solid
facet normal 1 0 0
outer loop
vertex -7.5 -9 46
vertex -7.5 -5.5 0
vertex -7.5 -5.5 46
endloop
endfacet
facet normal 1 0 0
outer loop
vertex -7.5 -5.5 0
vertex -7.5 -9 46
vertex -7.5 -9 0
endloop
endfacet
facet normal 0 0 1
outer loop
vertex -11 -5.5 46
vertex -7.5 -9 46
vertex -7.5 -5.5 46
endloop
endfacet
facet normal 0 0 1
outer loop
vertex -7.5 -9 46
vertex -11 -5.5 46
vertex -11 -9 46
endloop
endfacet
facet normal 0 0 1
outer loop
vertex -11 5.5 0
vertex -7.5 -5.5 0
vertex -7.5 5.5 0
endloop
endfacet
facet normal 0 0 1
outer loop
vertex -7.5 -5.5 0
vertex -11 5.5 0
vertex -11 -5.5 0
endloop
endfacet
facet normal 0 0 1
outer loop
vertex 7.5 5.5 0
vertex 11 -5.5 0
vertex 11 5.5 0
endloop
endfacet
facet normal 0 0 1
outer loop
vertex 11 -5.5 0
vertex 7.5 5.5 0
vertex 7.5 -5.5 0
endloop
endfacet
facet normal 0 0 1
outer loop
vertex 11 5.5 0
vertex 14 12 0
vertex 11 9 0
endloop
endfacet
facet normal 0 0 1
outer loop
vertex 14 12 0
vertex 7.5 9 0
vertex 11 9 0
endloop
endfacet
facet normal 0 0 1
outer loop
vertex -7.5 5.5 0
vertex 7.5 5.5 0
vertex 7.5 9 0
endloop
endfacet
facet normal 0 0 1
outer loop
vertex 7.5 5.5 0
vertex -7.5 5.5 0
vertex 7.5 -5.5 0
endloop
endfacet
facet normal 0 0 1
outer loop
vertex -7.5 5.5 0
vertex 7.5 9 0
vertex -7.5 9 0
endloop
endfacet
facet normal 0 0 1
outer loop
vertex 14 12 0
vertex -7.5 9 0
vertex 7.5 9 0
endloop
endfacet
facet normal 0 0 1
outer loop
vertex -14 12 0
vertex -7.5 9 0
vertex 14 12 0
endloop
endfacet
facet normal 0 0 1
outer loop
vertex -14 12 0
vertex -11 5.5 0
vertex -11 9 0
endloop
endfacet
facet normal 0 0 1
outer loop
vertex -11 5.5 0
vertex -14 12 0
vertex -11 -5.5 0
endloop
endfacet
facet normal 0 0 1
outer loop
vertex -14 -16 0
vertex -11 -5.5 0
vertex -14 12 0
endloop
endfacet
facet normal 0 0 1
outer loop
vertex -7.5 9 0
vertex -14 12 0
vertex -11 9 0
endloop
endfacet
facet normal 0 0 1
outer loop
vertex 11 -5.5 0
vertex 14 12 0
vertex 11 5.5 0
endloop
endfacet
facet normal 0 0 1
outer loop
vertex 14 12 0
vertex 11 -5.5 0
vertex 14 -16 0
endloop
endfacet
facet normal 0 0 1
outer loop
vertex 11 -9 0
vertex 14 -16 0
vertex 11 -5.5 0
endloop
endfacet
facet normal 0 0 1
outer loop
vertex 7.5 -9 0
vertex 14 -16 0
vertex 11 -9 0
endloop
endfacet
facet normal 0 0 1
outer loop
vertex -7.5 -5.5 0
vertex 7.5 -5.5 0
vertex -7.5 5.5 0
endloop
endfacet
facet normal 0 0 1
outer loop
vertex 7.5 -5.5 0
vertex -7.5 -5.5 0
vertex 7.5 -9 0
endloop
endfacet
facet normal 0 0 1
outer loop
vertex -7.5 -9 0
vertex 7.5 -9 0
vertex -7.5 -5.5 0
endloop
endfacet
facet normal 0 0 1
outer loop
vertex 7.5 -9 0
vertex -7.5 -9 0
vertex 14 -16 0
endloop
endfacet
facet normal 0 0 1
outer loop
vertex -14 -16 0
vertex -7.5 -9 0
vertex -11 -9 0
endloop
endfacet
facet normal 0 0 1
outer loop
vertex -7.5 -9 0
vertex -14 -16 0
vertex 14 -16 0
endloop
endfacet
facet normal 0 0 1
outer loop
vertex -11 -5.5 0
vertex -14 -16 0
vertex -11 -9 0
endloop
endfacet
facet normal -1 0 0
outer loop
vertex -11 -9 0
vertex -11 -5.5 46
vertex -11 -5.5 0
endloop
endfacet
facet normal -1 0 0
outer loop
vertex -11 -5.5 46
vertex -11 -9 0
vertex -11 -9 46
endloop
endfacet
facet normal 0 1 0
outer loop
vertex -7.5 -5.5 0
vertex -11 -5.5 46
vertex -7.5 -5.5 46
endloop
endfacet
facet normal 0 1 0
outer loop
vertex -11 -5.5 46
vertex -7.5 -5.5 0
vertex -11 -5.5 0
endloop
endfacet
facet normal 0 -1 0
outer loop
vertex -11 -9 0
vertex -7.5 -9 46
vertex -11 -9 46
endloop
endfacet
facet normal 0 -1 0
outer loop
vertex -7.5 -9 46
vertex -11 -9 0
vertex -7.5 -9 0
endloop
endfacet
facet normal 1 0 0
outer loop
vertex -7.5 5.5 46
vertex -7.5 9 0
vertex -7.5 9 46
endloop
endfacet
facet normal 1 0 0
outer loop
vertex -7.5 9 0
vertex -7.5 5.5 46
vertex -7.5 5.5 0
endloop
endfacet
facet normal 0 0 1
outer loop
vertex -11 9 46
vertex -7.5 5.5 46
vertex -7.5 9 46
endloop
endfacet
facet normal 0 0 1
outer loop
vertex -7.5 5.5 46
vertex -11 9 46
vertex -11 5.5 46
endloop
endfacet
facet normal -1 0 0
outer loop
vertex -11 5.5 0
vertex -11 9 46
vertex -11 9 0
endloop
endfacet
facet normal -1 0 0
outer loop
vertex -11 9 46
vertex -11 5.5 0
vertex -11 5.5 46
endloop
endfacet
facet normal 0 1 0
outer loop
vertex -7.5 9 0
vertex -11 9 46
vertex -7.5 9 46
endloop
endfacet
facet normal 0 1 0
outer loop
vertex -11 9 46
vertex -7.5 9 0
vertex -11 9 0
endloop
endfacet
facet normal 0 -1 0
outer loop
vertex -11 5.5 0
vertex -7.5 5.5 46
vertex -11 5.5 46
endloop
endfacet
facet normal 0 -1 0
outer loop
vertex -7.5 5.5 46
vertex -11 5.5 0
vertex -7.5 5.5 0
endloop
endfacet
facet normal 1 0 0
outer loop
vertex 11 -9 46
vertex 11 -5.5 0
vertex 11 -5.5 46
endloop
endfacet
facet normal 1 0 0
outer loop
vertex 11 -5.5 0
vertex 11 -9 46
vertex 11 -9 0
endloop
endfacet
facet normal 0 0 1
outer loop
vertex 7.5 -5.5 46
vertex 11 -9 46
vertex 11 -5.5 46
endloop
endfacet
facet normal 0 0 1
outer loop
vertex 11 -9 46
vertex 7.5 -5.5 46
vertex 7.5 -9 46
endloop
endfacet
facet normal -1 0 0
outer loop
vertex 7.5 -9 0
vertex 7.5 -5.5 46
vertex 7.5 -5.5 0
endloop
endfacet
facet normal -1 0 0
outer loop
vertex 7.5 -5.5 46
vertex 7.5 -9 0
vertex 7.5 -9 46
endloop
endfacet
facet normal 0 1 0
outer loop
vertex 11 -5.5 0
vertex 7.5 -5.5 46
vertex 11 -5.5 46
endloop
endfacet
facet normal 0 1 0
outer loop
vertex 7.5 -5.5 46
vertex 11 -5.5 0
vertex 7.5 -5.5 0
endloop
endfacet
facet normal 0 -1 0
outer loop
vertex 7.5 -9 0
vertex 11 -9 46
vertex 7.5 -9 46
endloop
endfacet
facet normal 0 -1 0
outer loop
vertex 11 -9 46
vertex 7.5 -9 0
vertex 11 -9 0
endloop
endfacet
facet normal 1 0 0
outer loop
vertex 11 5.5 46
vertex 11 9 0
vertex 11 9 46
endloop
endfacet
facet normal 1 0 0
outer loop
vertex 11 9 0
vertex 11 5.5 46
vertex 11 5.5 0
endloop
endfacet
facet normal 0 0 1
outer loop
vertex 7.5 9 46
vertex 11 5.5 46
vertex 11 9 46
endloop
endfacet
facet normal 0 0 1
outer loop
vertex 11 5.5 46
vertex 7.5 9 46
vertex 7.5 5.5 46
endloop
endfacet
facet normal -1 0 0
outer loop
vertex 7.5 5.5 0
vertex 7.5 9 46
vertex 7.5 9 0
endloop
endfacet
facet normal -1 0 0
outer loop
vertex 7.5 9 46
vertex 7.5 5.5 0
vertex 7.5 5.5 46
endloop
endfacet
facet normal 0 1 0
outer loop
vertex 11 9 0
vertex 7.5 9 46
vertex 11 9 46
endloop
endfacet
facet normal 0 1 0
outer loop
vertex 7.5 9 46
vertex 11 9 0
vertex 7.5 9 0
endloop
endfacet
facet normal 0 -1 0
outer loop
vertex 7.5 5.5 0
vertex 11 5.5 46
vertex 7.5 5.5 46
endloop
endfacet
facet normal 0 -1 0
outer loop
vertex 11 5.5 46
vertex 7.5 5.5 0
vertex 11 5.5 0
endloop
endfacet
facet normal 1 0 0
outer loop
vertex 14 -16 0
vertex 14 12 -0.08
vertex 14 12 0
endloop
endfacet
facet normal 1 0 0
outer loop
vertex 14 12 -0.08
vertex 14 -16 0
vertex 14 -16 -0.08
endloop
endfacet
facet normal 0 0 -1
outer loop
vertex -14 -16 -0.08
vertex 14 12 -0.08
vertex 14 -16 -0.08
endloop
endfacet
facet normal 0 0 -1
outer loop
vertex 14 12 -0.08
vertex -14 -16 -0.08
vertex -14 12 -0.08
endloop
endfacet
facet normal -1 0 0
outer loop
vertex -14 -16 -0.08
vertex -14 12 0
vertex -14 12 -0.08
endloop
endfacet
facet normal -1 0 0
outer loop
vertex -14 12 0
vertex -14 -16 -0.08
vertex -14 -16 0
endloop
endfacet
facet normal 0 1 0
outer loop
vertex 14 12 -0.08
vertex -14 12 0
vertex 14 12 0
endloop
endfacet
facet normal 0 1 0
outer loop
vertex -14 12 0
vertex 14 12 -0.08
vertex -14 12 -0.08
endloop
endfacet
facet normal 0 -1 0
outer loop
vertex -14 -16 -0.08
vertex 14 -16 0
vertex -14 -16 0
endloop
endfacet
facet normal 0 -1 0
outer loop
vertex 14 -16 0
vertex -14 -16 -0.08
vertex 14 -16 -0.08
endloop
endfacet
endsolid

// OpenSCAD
/*
EV charger enclosure + street-light/address-base baseline
=========================================================

OpenSCAD units: inches.  Treat one OpenSCAD unit as one inch.

This model is a parameterized reconstruction of the uploaded Tinkercad OBJ.
The OBJ itself appears to have been exported in centimeters: 13.97 cm in the
OBJ maps to a 5.5" composite-decking board, and 119.38 cm maps to 47" overall
height.

Coordinate convention used here:
  X = left/right, centered on the enclosure
  Y = depth, negative Y is the street/front side
  Z = height above grade

Notes:
  - Body/enclosure depth is about 20".  The address/light projection extends
    forward, so the full visual depth including that element is larger.
  - Most composite-board intersections are intentionally allowed to overlap a
    little, as the Tinkercad model did.  This keeps the baseline easy to edit.
  - The internal lumber, conduit, fasteners, and actual equipment dimensions
    should be refined before using this as a build document.
*/

// -----------------------------------------------------------------------------
// MASTER DISPLAY SWITCHES
// -----------------------------------------------------------------------------
show_posts                  = true;
show_composite_shell        = false;
show_top_cap                = false;
show_equipment_placeholders = false;
show_ev_connector_handle    = false;
show_unifi_ap_placeholder   = false;
show_outlet_placeholder     = false;
show_conduit_placeholders   = false;
show_optional_lumber_rails  = false;
show_address_light_block    = false;
show_address_numbers        = false;
show_reference_envelope     = false;
show_footprint_pad          = true;
show_part_labels            = false;
show_imported_obj_reference = false;   // requires tinker.obj beside this .scad
show_cutlist_echos          = false;    // emits a rough BOM/cut list to console

// -----------------------------------------------------------------------------
// PRIMARY DIMENSIONS
// -----------------------------------------------------------------------------
overall_width  = 24.0;     // intended finished enclosure width
body_depth     = 20.0;     // intended enclosure depth, excluding front projection
overall_height = 47.0;     // intended finished height

// 4x4 nominal wood posts: actual roughly 3.5" x 3.5".
post_size          = 3.5;
post_height        = 46.0;
post_shell_setback = 1.0;  // distance from exterior shell face to outside of posts

// Composite decking.  The OBJ board width corresponds to 5.5".
deck_board_face_width = 5.5;   // visible face width of deck board
 deck_board_thickness = 1.0;   // board thickness / shell thickness
board_gap             = 0.125; // vertical reveal between courses
vertical_board_rows   = 8;

// Bottom ripped strip/kick strip visible in the Tinkercad model.
bottom_clearance   = 1.0;
bottom_strip_height = 1.0;
first_board_z      = bottom_clearance + bottom_strip_height + board_gap;

// Top cap boards lie flat over the enclosure.
top_cap_count         = 3;
top_cap_thickness     = deck_board_thickness;
top_cap_board_width   = deck_board_face_width;
top_cap_side_margin   = 1.0;
top_cap_front_setback = 1.1;
top_cap_rear_setback  = 1.0;
top_cap_length        = overall_width - 2 * top_cap_side_margin;
top_cap_gap           = top_cap_count > 1 ?
                        (body_depth - top_cap_front_setback - top_cap_rear_setback - top_cap_count * top_cap_board_width) / (top_cap_count - 1) : 0;

// Rear service opening approximation from the OBJ.
rear_wing_width  = deck_board_face_width;
rear_return_depth = 4.5;
side_board_length = body_depth - 2 * deck_board_thickness;

// Equipment placeholder sizes and positions, based on the OBJ scale.
equipment_backer_width     = 7.0;
equipment_backer_height    = 24.0;
equipment_backer_thickness = 0.25;
equipment_backer_center_z  = 26.0;
equipment_backer_y         = -6.0;

charger_body_width  = 6.6;
charger_body_depth  = 3.3;
charger_body_height = 6.6;
charger_body_center_z = 27.3;

holster_width  = 3.3;
holster_depth  = 1.34;
holster_height = 5.4;
holster_center_z = 16.9;

// UniFi / AP rough placeholder; set dimensions/position to actual hardware later.
ap_width  = 2.8;
ap_depth  = 1.1;
ap_height = 6.0;
ap_center = [-4.6, equipment_backer_y - 0.05, 35.4];

// 120V outlet rough placeholder; set position to the chosen circuit location.
outlet_width  = 3.0;
outlet_depth  = 1.0;
outlet_height = 4.75;
outlet_center = [4.8, equipment_backer_y - 0.05, 13.0];

// Conduit placeholders, when enabled.
conduit_od = 0.75;
conduit_center_x = 5.9;
conduit_y = equipment_backer_y - 0.2;

// Address / downward-facing light block at the front top.
front_projection_depth = 4.0;
address_block_width  = 11.75;
address_block_depth  = 4.0;
address_block_height = 4.0;
address_block_center_z = 42.35;
address_number_text = "4754";
address_text_height = 4.0;
address_text_depth  = 0.25;
address_text_center_z = 36.0;

// Optional imported Tinkercad OBJ reference.  Keep disabled unless the OBJ file
// is available next to this OpenSCAD file.
obj_reference_file = "tinker.obj";
cm_to_inch = 1 / 2.54;
obj_center_cm_x = 66.080;
obj_center_cm_y = 5.4191;

// -----------------------------------------------------------------------------
// COLORS
// -----------------------------------------------------------------------------
composite_color   = [0.17, 0.18, 0.19, 1.0];
wood_post_color   = [0.50, 0.31, 0.16, 1.0];
white_color       = [0.98, 0.98, 0.98, 1.0];
light_gray_color  = [0.74, 0.78, 0.80, 1.0];
mid_gray_color    = [0.38, 0.40, 0.42, 1.0];
dark_gray_color   = [0.12, 0.13, 0.14, 1.0];
conduit_color     = [0.62, 0.62, 0.60, 1.0];
lens_color        = [1.0, 0.93, 0.60, 0.55];
envelope_color    = [0.1, 0.4, 1.0, 0.08];
label_color       = [1.0, 0.85, 0.15, 1.0];

// -----------------------------------------------------------------------------
// BASIC HELPERS
// -----------------------------------------------------------------------------
module part_box(size=[1,1,1], center=[0,0,0], c=[0.8,0.8,0.8,1]) {
    color(c)
        translate([center[0] - size[0]/2, center[1] - size[1]/2, center[2] - size[2]/2])
            cube(size, center=false);
}

module rounded_box_xz(size=[1,1,1], r=0.125, center=[0,0,0], c=[0.8,0.8,0.8,1]) {
    // Rounded in the visible X-Z face; extruded through Y depth.
    color(c)
        translate([center[0], center[1] + size[1]/2, center[2]])
            rotate([90, 0, 0])
                linear_extrude(height=size[1], convexity=6)
                    offset(r=r)
                        square([max(0.01, size[0] - 2*r), max(0.01, size[2] - 2*r)], center=true);
}

module cyl_x(len=1, d=1, center=[0,0,0], c=[0.8,0.8,0.8,1], facets=48) {
    color(c)
        translate([center[0] - len/2, center[1], center[2]])
            rotate([0, 90, 0])
                cylinder(h=len, d=d, $fn=facets);
}

module cyl_y(len=1, d=1, center=[0,0,0], c=[0.8,0.8,0.8,1], facets=48) {
    color(c)
        translate([center[0], center[1] - len/2, center[2]])
            rotate([-90, 0, 0])
                cylinder(h=len, d=d, $fn=facets);
}

module cyl_z(len=1, d=1, center=[0,0,0], c=[0.8,0.8,0.8,1], facets=48) {
    color(c)
        translate([center[0], center[1], center[2] - len/2])
            cylinder(h=len, d=d, $fn=facets);
}

module front_text(txt="TEXT", txt_size=1, depth=0.1, center=[0,0,0], c=[1,1,1,1]) {
    color(c)
        translate([center[0], center[1], center[2]])
            rotate([90, 0, 0])
                linear_extrude(height=depth, convexity=10)
                    text(txt, size=txt_size, halign="center", valign="center", font="Liberation Sans:style=Bold");
}

module optional_label(txt="", center=[0,0,0], size=0.35) {
    if (show_part_labels)
        front_text(txt=txt, txt_size=size, depth=0.035, center=center, c=label_color);
}

// -----------------------------------------------------------------------------
// STRUCTURAL MODULES
// -----------------------------------------------------------------------------
module four_posts() {
    post_x = overall_width/2 - post_shell_setback - post_size/2;
    post_y = body_depth/2 - post_shell_setback - post_size/2;
    for (sx=[-1,1])
        for (sy=[-1,1]) {
            part_box(size=[post_size, post_size, post_height],
                     center=[sx*post_x, sy*post_y, post_height/2],
                     c=wood_post_color);
        }
}

module bottom_shell_strips() {
    zc = bottom_clearance + bottom_strip_height/2;
    // Full-width front ripped strip.
    part_box(size=[overall_width, deck_board_thickness, bottom_strip_height],
             center=[0, -body_depth/2 + deck_board_thickness/2, zc],
             c=composite_color);

    // Left/right side ripped strips.
    for (sx=[-1,1])
        part_box(size=[deck_board_thickness, side_board_length, bottom_strip_height],
                 center=[sx*(overall_width/2 - deck_board_thickness/2), 0, zc],
                 c=composite_color);

    // Rear wing ripped strips.
    for (sx=[-1,1])
        part_box(size=[rear_wing_width, deck_board_thickness, bottom_strip_height],
                 center=[sx*(overall_width/2 - rear_wing_width/2), body_depth/2 - deck_board_thickness/2, zc],
                 c=composite_color);

    // Rear return ripped strips near service opening.
    for (sx=[-1,1])
        part_box(size=[deck_board_thickness, rear_return_depth, bottom_strip_height],
                 center=[sx*(overall_width/2 - rear_wing_width + deck_board_thickness/2),
                         body_depth/2 - deck_board_thickness - rear_return_depth/2,
                         zc],
                 c=composite_color);
}

module deck_course(row=0) {
    zc = first_board_z + row * (deck_board_face_width + board_gap) + deck_board_face_width/2;

    // Full-width street/front face.
    part_box(size=[overall_width, deck_board_thickness, deck_board_face_width],
             center=[0, -body_depth/2 + deck_board_thickness/2, zc],
             c=composite_color);

    // Continuous left and right side faces.
    for (sx=[-1,1])
        part_box(size=[deck_board_thickness, side_board_length, deck_board_face_width],
                 center=[sx*(overall_width/2 - deck_board_thickness/2), 0, zc],
                 c=composite_color);

    // Rear left and right wings, leaving a service opening.
    for (sx=[-1,1])
        part_box(size=[rear_wing_width, deck_board_thickness, deck_board_face_width],
                 center=[sx*(overall_width/2 - rear_wing_width/2), body_depth/2 - deck_board_thickness/2, zc],
                 c=composite_color);

    // Rear return pieces along the service-opening jambs.
    for (sx=[-1,1])
        part_box(size=[deck_board_thickness, rear_return_depth, deck_board_face_width],
                 center=[sx*(overall_width/2 - rear_wing_width + deck_board_thickness/2),
                         body_depth/2 - deck_board_thickness - rear_return_depth/2,
                         zc],
                 c=composite_color);
}

module composite_shell() {
    bottom_shell_strips();
    for (row=[0:vertical_board_rows-1])
        deck_course(row=row);
}

module top_cap_boards() {
    zc = overall_height - top_cap_thickness/2;
    for (i=[0:top_cap_count-1]) {
        yc = -body_depth/2 + top_cap_front_setback + top_cap_board_width/2 + i * (top_cap_board_width + top_cap_gap);
        part_box(size=[top_cap_length, top_cap_board_width, top_cap_thickness],
                 center=[0, yc, zc],
                 c=composite_color);
    }
}

module optional_lumber_rails() {
    // Placeholder only: these are not in the Tinkercad model.  Use these as a
    // starting point for internal 2x lumber and revise for real load paths.
    rail_height = 1.5;
    rail_depth  = 3.5;
    rail_length = overall_width - 2*(post_shell_setback + post_size);
    for (z=[12, 26, 40]) {
        part_box(size=[rail_length, rail_depth, rail_height],
                 center=[0, -body_depth/2 + deck_board_thickness + rail_depth/2, z],
                 c=[0.55,0.38,0.22,1]);
        part_box(size=[rail_length, rail_depth, rail_height],
                 center=[0, body_depth/2 - deck_board_thickness - rail_depth/2, z],
                 c=[0.55,0.38,0.22,1]);
    }
}

// -----------------------------------------------------------------------------
// EQUIPMENT PLACEHOLDERS
// -----------------------------------------------------------------------------
module ev_charger_and_holster() {
    // White mounting/backing plate from the Tinkercad model.
    part_box(size=[equipment_backer_width, equipment_backer_thickness, equipment_backer_height],
             center=[0, equipment_backer_y, equipment_backer_center_z],
             c=white_color);
    optional_label("mount board", [0, equipment_backer_y - equipment_backer_thickness/2 - 0.04, equipment_backer_center_z + 10.8], 0.35);

    // Charger body, rough wallbox placeholder.
    rounded_box_xz(size=[charger_body_width, charger_body_depth, charger_body_height],
                   r=0.35,
                   center=[0, equipment_backer_y + equipment_backer_thickness/2 + charger_body_depth/2,
                           charger_body_center_z],
                   c=mid_gray_color);
    optional_label("EVSE", [0, equipment_backer_y - 0.2, charger_body_center_z], 0.55);

    // Holster / cable-rest placeholder.
    rounded_box_xz(size=[holster_width, holster_depth, holster_height],
                   r=0.20,
                   center=[0, equipment_backer_y + equipment_backer_thickness/2 + holster_depth/2,
                           holster_center_z],
                   c=light_gray_color);
    optional_label("holster", [0, equipment_backer_y - 0.2, holster_center_z], 0.35);
}

module ev_connector_handle_placeholder() {
    // Approximation of the complex gray Tinkercad connector/handle object.
    base_y = equipment_backer_y + equipment_backer_thickness/2 + charger_body_depth + 0.25;

    // Blocky socket/head.
    rounded_box_xz(size=[4.0, 1.4, 4.6],
                   r=0.18,
                   center=[-1.2, base_y, 34.2],
                   c=mid_gray_color);

    // Short barrel extending away from the mounting plate.
    cyl_y(len=3.6, d=2.4, center=[1.3, base_y + 1.3, 35.0], c=mid_gray_color, facets=48);

    // Angled grip / handle.
    color(mid_gray_color)
        translate([2.3, base_y + 2.9, 31.3])
            rotate([25, 0, 0])
                cylinder(h=5.2, d=1.55, $fn=48);

    // Small upper block, matching the rough geometry in the OBJ.
    rounded_box_xz(size=[2.4, 1.2, 3.1],
                   r=0.10,
                   center=[-0.1, base_y, 37.8],
                   c=mid_gray_color);
}

module unifi_ap_placeholder() {
    // Slim vertical AP placeholder.  Move/resize after measuring the actual AP
    // and desired bracket orientation.
    rounded_box_xz(size=[ap_width, ap_depth, ap_height],
                   r=0.40,
                   center=ap_center,
                   c=white_color);
    optional_label("AP", [ap_center[0], ap_center[1] - ap_depth/2 - 0.04, ap_center[2]], 0.45);
}

module weatherproof_outlet_placeholder() {
    // Weatherproof box + simplified duplex face.
    rounded_box_xz(size=[outlet_width, outlet_depth, outlet_height],
                   r=0.18,
                   center=outlet_center,
                   c=light_gray_color);

    face_y = outlet_center[1] - outlet_depth/2 - 0.04;
    rounded_box_xz(size=[1.35, 0.10, 3.0],
                   r=0.08,
                   center=[outlet_center[0], face_y, outlet_center[2]],
                   c=white_color);

    // Slot marks on the face.
    for (zz=[outlet_center[2]-0.75, outlet_center[2]+0.75]) {
        part_box(size=[0.10, 0.06, 0.36], center=[outlet_center[0]-0.22, face_y-0.07, zz], c=dark_gray_color);
        part_box(size=[0.10, 0.06, 0.36], center=[outlet_center[0]+0.22, face_y-0.07, zz], c=dark_gray_color);
        cyl_y(len=0.07, d=0.16, center=[outlet_center[0], face_y-0.08, zz-0.42], c=dark_gray_color, facets=24);
    }
    optional_label("120V", [outlet_center[0], face_y-0.12, outlet_center[2]+2.7], 0.35);
}

module conduit_placeholders() {
    // Simple draft conduit route.  Replace with actual conduit type, sweep
    // radius, box entries, straps, burial/emergence details, and clearances.
    cyl_z(len=28, d=conduit_od, center=[conduit_center_x, conduit_y, 14], c=conduit_color, facets=32);
    cyl_x(len=2.2, d=conduit_od, center=[conduit_center_x - 1.1, conduit_y, outlet_center[2]], c=conduit_color, facets=32);
    cyl_x(len=2.8, d=conduit_od, center=[conduit_center_x - 1.4, conduit_y, charger_body_center_z], c=conduit_color, facets=32);
}

// -----------------------------------------------------------------------------
// ADDRESS / LIGHT / FRONT PROJECTION
// -----------------------------------------------------------------------------
module address_and_light_block() {
    // Dark rectangular front projection from the OBJ.  Interpreted here as the
    // address/light housing.
    block_center_y = -body_depth/2 - address_block_depth/2;
    part_box(size=[address_block_width, address_block_depth, address_block_height],
             center=[0, block_center_y, address_block_center_z],
             c=dark_gray_color);

    // Downward-facing diffuser/lens underneath the projection.
    part_box(size=[address_block_width - 1.5, address_block_depth - 0.9, 0.35],
             center=[0, block_center_y, address_block_center_z - address_block_height/2 - 0.20],
             c=lens_color);

    optional_label("light", [0, block_center_y - address_block_depth/2 - 0.08, address_block_center_z], 0.45);
}

module address_numbers() {
    // Raised address numbers on the front face.  Change address_number_text above.
    front_y = -body_depth/2 - 0.05;
    front_text(txt=address_number_text,
               txt_size=address_text_height,
               depth=address_text_depth,
               center=[0, front_y, address_text_center_z],
               c=light_gray_color);
}

// -----------------------------------------------------------------------------
// REFERENCES / UTILITIES
// -----------------------------------------------------------------------------
module reference_envelope() {
    part_box(size=[overall_width, body_depth, overall_height],
             center=[0, 0, overall_height/2],
             c=envelope_color);
}

module footprint_pad() {
    pad_margin = 2.0;
    part_box(size=[overall_width + 2*pad_margin, body_depth + front_projection_depth + 2*pad_margin, 0.08],
             center=[0, -front_projection_depth/2, -0.04],
             c=[0.55,0.55,0.55,0.22]);
}

module imported_tinkercad_obj_reference() {
    // The original OBJ imports in centimeters.  This scales to inches and
    // recenters it to this model's origin.  Keep disabled unless needed.
    color([1.0, 0.0, 0.0, 0.22])
        scale([cm_to_inch, cm_to_inch, cm_to_inch])
            translate([-obj_center_cm_x, -obj_center_cm_y, 0])
                import(obj_reference_file, convexity=10);
}

module cutlist_summary() {
    if (show_cutlist_echos) {
        echo("ROUGH CUT LIST / BOM - all dimensions in inches");
        echo("4x4 actual wood posts", "qty", 4, "size", post_size, "x", post_size, "x", post_height);
        echo("Composite decking, full front courses", "qty", vertical_board_rows, "cut length", overall_width, "face width", deck_board_face_width);
        echo("Composite decking, front bottom ripped strip", "qty", 1, "cut length", overall_width, "ripped height", bottom_strip_height);
        echo("Composite decking, side courses", "qty", 2 * vertical_board_rows, "cut length", side_board_length, "face width", deck_board_face_width);
        echo("Composite decking, side bottom ripped strips", "qty", 2, "cut length", side_board_length, "ripped height", bottom_strip_height);
        echo("Composite decking, rear wing courses", "qty", 2 * vertical_board_rows, "cut length", rear_wing_width, "face width", deck_board_face_width);
        echo("Composite decking, rear wing bottom ripped strips", "qty", 2, "cut length", rear_wing_width, "ripped height", bottom_strip_height);
        echo("Composite decking, rear return courses", "qty", 2 * vertical_board_rows, "cut length", rear_return_depth, "face width", deck_board_face_width);
        echo("Composite decking, rear return bottom ripped strips", "qty", 2, "cut length", rear_return_depth, "ripped height", bottom_strip_height);
        echo("Composite decking, top cap boards", "qty", top_cap_count, "cut length", top_cap_length, "board width", top_cap_board_width, "computed gap", top_cap_gap);
        echo("Equipment placeholders", "EV backer", equipment_backer_width, "x", equipment_backer_height, "charger body", charger_body_width, "x", charger_body_height, "outlet box", outlet_width, "x", outlet_height);
        echo("Overall shell", "width", overall_width, "body depth", body_depth, "height", overall_height, "front projection adds", front_projection_depth);
    }
}

// -----------------------------------------------------------------------------
// MAIN ASSEMBLY
// -----------------------------------------------------------------------------
module ev_charger_enclosure() {
    if (show_footprint_pad) footprint_pad();
    if (show_reference_envelope) reference_envelope();
    if (show_imported_obj_reference) imported_tinkercad_obj_reference();

    if (show_posts) four_posts();
    if (show_composite_shell) composite_shell();
    if (show_top_cap) top_cap_boards();
    if (show_optional_lumber_rails) optional_lumber_rails();

    if (show_equipment_placeholders) ev_charger_and_holster();
    if (show_ev_connector_handle) ev_connector_handle_placeholder();
    if (show_unifi_ap_placeholder) unifi_ap_placeholder();
    if (show_outlet_placeholder) weatherproof_outlet_placeholder();
    if (show_conduit_placeholders) conduit_placeholders();

    if (show_address_light_block) address_and_light_block();
    if (show_address_numbers) address_numbers();

    cutlist_summary();
}

ev_charger_enclosure();
